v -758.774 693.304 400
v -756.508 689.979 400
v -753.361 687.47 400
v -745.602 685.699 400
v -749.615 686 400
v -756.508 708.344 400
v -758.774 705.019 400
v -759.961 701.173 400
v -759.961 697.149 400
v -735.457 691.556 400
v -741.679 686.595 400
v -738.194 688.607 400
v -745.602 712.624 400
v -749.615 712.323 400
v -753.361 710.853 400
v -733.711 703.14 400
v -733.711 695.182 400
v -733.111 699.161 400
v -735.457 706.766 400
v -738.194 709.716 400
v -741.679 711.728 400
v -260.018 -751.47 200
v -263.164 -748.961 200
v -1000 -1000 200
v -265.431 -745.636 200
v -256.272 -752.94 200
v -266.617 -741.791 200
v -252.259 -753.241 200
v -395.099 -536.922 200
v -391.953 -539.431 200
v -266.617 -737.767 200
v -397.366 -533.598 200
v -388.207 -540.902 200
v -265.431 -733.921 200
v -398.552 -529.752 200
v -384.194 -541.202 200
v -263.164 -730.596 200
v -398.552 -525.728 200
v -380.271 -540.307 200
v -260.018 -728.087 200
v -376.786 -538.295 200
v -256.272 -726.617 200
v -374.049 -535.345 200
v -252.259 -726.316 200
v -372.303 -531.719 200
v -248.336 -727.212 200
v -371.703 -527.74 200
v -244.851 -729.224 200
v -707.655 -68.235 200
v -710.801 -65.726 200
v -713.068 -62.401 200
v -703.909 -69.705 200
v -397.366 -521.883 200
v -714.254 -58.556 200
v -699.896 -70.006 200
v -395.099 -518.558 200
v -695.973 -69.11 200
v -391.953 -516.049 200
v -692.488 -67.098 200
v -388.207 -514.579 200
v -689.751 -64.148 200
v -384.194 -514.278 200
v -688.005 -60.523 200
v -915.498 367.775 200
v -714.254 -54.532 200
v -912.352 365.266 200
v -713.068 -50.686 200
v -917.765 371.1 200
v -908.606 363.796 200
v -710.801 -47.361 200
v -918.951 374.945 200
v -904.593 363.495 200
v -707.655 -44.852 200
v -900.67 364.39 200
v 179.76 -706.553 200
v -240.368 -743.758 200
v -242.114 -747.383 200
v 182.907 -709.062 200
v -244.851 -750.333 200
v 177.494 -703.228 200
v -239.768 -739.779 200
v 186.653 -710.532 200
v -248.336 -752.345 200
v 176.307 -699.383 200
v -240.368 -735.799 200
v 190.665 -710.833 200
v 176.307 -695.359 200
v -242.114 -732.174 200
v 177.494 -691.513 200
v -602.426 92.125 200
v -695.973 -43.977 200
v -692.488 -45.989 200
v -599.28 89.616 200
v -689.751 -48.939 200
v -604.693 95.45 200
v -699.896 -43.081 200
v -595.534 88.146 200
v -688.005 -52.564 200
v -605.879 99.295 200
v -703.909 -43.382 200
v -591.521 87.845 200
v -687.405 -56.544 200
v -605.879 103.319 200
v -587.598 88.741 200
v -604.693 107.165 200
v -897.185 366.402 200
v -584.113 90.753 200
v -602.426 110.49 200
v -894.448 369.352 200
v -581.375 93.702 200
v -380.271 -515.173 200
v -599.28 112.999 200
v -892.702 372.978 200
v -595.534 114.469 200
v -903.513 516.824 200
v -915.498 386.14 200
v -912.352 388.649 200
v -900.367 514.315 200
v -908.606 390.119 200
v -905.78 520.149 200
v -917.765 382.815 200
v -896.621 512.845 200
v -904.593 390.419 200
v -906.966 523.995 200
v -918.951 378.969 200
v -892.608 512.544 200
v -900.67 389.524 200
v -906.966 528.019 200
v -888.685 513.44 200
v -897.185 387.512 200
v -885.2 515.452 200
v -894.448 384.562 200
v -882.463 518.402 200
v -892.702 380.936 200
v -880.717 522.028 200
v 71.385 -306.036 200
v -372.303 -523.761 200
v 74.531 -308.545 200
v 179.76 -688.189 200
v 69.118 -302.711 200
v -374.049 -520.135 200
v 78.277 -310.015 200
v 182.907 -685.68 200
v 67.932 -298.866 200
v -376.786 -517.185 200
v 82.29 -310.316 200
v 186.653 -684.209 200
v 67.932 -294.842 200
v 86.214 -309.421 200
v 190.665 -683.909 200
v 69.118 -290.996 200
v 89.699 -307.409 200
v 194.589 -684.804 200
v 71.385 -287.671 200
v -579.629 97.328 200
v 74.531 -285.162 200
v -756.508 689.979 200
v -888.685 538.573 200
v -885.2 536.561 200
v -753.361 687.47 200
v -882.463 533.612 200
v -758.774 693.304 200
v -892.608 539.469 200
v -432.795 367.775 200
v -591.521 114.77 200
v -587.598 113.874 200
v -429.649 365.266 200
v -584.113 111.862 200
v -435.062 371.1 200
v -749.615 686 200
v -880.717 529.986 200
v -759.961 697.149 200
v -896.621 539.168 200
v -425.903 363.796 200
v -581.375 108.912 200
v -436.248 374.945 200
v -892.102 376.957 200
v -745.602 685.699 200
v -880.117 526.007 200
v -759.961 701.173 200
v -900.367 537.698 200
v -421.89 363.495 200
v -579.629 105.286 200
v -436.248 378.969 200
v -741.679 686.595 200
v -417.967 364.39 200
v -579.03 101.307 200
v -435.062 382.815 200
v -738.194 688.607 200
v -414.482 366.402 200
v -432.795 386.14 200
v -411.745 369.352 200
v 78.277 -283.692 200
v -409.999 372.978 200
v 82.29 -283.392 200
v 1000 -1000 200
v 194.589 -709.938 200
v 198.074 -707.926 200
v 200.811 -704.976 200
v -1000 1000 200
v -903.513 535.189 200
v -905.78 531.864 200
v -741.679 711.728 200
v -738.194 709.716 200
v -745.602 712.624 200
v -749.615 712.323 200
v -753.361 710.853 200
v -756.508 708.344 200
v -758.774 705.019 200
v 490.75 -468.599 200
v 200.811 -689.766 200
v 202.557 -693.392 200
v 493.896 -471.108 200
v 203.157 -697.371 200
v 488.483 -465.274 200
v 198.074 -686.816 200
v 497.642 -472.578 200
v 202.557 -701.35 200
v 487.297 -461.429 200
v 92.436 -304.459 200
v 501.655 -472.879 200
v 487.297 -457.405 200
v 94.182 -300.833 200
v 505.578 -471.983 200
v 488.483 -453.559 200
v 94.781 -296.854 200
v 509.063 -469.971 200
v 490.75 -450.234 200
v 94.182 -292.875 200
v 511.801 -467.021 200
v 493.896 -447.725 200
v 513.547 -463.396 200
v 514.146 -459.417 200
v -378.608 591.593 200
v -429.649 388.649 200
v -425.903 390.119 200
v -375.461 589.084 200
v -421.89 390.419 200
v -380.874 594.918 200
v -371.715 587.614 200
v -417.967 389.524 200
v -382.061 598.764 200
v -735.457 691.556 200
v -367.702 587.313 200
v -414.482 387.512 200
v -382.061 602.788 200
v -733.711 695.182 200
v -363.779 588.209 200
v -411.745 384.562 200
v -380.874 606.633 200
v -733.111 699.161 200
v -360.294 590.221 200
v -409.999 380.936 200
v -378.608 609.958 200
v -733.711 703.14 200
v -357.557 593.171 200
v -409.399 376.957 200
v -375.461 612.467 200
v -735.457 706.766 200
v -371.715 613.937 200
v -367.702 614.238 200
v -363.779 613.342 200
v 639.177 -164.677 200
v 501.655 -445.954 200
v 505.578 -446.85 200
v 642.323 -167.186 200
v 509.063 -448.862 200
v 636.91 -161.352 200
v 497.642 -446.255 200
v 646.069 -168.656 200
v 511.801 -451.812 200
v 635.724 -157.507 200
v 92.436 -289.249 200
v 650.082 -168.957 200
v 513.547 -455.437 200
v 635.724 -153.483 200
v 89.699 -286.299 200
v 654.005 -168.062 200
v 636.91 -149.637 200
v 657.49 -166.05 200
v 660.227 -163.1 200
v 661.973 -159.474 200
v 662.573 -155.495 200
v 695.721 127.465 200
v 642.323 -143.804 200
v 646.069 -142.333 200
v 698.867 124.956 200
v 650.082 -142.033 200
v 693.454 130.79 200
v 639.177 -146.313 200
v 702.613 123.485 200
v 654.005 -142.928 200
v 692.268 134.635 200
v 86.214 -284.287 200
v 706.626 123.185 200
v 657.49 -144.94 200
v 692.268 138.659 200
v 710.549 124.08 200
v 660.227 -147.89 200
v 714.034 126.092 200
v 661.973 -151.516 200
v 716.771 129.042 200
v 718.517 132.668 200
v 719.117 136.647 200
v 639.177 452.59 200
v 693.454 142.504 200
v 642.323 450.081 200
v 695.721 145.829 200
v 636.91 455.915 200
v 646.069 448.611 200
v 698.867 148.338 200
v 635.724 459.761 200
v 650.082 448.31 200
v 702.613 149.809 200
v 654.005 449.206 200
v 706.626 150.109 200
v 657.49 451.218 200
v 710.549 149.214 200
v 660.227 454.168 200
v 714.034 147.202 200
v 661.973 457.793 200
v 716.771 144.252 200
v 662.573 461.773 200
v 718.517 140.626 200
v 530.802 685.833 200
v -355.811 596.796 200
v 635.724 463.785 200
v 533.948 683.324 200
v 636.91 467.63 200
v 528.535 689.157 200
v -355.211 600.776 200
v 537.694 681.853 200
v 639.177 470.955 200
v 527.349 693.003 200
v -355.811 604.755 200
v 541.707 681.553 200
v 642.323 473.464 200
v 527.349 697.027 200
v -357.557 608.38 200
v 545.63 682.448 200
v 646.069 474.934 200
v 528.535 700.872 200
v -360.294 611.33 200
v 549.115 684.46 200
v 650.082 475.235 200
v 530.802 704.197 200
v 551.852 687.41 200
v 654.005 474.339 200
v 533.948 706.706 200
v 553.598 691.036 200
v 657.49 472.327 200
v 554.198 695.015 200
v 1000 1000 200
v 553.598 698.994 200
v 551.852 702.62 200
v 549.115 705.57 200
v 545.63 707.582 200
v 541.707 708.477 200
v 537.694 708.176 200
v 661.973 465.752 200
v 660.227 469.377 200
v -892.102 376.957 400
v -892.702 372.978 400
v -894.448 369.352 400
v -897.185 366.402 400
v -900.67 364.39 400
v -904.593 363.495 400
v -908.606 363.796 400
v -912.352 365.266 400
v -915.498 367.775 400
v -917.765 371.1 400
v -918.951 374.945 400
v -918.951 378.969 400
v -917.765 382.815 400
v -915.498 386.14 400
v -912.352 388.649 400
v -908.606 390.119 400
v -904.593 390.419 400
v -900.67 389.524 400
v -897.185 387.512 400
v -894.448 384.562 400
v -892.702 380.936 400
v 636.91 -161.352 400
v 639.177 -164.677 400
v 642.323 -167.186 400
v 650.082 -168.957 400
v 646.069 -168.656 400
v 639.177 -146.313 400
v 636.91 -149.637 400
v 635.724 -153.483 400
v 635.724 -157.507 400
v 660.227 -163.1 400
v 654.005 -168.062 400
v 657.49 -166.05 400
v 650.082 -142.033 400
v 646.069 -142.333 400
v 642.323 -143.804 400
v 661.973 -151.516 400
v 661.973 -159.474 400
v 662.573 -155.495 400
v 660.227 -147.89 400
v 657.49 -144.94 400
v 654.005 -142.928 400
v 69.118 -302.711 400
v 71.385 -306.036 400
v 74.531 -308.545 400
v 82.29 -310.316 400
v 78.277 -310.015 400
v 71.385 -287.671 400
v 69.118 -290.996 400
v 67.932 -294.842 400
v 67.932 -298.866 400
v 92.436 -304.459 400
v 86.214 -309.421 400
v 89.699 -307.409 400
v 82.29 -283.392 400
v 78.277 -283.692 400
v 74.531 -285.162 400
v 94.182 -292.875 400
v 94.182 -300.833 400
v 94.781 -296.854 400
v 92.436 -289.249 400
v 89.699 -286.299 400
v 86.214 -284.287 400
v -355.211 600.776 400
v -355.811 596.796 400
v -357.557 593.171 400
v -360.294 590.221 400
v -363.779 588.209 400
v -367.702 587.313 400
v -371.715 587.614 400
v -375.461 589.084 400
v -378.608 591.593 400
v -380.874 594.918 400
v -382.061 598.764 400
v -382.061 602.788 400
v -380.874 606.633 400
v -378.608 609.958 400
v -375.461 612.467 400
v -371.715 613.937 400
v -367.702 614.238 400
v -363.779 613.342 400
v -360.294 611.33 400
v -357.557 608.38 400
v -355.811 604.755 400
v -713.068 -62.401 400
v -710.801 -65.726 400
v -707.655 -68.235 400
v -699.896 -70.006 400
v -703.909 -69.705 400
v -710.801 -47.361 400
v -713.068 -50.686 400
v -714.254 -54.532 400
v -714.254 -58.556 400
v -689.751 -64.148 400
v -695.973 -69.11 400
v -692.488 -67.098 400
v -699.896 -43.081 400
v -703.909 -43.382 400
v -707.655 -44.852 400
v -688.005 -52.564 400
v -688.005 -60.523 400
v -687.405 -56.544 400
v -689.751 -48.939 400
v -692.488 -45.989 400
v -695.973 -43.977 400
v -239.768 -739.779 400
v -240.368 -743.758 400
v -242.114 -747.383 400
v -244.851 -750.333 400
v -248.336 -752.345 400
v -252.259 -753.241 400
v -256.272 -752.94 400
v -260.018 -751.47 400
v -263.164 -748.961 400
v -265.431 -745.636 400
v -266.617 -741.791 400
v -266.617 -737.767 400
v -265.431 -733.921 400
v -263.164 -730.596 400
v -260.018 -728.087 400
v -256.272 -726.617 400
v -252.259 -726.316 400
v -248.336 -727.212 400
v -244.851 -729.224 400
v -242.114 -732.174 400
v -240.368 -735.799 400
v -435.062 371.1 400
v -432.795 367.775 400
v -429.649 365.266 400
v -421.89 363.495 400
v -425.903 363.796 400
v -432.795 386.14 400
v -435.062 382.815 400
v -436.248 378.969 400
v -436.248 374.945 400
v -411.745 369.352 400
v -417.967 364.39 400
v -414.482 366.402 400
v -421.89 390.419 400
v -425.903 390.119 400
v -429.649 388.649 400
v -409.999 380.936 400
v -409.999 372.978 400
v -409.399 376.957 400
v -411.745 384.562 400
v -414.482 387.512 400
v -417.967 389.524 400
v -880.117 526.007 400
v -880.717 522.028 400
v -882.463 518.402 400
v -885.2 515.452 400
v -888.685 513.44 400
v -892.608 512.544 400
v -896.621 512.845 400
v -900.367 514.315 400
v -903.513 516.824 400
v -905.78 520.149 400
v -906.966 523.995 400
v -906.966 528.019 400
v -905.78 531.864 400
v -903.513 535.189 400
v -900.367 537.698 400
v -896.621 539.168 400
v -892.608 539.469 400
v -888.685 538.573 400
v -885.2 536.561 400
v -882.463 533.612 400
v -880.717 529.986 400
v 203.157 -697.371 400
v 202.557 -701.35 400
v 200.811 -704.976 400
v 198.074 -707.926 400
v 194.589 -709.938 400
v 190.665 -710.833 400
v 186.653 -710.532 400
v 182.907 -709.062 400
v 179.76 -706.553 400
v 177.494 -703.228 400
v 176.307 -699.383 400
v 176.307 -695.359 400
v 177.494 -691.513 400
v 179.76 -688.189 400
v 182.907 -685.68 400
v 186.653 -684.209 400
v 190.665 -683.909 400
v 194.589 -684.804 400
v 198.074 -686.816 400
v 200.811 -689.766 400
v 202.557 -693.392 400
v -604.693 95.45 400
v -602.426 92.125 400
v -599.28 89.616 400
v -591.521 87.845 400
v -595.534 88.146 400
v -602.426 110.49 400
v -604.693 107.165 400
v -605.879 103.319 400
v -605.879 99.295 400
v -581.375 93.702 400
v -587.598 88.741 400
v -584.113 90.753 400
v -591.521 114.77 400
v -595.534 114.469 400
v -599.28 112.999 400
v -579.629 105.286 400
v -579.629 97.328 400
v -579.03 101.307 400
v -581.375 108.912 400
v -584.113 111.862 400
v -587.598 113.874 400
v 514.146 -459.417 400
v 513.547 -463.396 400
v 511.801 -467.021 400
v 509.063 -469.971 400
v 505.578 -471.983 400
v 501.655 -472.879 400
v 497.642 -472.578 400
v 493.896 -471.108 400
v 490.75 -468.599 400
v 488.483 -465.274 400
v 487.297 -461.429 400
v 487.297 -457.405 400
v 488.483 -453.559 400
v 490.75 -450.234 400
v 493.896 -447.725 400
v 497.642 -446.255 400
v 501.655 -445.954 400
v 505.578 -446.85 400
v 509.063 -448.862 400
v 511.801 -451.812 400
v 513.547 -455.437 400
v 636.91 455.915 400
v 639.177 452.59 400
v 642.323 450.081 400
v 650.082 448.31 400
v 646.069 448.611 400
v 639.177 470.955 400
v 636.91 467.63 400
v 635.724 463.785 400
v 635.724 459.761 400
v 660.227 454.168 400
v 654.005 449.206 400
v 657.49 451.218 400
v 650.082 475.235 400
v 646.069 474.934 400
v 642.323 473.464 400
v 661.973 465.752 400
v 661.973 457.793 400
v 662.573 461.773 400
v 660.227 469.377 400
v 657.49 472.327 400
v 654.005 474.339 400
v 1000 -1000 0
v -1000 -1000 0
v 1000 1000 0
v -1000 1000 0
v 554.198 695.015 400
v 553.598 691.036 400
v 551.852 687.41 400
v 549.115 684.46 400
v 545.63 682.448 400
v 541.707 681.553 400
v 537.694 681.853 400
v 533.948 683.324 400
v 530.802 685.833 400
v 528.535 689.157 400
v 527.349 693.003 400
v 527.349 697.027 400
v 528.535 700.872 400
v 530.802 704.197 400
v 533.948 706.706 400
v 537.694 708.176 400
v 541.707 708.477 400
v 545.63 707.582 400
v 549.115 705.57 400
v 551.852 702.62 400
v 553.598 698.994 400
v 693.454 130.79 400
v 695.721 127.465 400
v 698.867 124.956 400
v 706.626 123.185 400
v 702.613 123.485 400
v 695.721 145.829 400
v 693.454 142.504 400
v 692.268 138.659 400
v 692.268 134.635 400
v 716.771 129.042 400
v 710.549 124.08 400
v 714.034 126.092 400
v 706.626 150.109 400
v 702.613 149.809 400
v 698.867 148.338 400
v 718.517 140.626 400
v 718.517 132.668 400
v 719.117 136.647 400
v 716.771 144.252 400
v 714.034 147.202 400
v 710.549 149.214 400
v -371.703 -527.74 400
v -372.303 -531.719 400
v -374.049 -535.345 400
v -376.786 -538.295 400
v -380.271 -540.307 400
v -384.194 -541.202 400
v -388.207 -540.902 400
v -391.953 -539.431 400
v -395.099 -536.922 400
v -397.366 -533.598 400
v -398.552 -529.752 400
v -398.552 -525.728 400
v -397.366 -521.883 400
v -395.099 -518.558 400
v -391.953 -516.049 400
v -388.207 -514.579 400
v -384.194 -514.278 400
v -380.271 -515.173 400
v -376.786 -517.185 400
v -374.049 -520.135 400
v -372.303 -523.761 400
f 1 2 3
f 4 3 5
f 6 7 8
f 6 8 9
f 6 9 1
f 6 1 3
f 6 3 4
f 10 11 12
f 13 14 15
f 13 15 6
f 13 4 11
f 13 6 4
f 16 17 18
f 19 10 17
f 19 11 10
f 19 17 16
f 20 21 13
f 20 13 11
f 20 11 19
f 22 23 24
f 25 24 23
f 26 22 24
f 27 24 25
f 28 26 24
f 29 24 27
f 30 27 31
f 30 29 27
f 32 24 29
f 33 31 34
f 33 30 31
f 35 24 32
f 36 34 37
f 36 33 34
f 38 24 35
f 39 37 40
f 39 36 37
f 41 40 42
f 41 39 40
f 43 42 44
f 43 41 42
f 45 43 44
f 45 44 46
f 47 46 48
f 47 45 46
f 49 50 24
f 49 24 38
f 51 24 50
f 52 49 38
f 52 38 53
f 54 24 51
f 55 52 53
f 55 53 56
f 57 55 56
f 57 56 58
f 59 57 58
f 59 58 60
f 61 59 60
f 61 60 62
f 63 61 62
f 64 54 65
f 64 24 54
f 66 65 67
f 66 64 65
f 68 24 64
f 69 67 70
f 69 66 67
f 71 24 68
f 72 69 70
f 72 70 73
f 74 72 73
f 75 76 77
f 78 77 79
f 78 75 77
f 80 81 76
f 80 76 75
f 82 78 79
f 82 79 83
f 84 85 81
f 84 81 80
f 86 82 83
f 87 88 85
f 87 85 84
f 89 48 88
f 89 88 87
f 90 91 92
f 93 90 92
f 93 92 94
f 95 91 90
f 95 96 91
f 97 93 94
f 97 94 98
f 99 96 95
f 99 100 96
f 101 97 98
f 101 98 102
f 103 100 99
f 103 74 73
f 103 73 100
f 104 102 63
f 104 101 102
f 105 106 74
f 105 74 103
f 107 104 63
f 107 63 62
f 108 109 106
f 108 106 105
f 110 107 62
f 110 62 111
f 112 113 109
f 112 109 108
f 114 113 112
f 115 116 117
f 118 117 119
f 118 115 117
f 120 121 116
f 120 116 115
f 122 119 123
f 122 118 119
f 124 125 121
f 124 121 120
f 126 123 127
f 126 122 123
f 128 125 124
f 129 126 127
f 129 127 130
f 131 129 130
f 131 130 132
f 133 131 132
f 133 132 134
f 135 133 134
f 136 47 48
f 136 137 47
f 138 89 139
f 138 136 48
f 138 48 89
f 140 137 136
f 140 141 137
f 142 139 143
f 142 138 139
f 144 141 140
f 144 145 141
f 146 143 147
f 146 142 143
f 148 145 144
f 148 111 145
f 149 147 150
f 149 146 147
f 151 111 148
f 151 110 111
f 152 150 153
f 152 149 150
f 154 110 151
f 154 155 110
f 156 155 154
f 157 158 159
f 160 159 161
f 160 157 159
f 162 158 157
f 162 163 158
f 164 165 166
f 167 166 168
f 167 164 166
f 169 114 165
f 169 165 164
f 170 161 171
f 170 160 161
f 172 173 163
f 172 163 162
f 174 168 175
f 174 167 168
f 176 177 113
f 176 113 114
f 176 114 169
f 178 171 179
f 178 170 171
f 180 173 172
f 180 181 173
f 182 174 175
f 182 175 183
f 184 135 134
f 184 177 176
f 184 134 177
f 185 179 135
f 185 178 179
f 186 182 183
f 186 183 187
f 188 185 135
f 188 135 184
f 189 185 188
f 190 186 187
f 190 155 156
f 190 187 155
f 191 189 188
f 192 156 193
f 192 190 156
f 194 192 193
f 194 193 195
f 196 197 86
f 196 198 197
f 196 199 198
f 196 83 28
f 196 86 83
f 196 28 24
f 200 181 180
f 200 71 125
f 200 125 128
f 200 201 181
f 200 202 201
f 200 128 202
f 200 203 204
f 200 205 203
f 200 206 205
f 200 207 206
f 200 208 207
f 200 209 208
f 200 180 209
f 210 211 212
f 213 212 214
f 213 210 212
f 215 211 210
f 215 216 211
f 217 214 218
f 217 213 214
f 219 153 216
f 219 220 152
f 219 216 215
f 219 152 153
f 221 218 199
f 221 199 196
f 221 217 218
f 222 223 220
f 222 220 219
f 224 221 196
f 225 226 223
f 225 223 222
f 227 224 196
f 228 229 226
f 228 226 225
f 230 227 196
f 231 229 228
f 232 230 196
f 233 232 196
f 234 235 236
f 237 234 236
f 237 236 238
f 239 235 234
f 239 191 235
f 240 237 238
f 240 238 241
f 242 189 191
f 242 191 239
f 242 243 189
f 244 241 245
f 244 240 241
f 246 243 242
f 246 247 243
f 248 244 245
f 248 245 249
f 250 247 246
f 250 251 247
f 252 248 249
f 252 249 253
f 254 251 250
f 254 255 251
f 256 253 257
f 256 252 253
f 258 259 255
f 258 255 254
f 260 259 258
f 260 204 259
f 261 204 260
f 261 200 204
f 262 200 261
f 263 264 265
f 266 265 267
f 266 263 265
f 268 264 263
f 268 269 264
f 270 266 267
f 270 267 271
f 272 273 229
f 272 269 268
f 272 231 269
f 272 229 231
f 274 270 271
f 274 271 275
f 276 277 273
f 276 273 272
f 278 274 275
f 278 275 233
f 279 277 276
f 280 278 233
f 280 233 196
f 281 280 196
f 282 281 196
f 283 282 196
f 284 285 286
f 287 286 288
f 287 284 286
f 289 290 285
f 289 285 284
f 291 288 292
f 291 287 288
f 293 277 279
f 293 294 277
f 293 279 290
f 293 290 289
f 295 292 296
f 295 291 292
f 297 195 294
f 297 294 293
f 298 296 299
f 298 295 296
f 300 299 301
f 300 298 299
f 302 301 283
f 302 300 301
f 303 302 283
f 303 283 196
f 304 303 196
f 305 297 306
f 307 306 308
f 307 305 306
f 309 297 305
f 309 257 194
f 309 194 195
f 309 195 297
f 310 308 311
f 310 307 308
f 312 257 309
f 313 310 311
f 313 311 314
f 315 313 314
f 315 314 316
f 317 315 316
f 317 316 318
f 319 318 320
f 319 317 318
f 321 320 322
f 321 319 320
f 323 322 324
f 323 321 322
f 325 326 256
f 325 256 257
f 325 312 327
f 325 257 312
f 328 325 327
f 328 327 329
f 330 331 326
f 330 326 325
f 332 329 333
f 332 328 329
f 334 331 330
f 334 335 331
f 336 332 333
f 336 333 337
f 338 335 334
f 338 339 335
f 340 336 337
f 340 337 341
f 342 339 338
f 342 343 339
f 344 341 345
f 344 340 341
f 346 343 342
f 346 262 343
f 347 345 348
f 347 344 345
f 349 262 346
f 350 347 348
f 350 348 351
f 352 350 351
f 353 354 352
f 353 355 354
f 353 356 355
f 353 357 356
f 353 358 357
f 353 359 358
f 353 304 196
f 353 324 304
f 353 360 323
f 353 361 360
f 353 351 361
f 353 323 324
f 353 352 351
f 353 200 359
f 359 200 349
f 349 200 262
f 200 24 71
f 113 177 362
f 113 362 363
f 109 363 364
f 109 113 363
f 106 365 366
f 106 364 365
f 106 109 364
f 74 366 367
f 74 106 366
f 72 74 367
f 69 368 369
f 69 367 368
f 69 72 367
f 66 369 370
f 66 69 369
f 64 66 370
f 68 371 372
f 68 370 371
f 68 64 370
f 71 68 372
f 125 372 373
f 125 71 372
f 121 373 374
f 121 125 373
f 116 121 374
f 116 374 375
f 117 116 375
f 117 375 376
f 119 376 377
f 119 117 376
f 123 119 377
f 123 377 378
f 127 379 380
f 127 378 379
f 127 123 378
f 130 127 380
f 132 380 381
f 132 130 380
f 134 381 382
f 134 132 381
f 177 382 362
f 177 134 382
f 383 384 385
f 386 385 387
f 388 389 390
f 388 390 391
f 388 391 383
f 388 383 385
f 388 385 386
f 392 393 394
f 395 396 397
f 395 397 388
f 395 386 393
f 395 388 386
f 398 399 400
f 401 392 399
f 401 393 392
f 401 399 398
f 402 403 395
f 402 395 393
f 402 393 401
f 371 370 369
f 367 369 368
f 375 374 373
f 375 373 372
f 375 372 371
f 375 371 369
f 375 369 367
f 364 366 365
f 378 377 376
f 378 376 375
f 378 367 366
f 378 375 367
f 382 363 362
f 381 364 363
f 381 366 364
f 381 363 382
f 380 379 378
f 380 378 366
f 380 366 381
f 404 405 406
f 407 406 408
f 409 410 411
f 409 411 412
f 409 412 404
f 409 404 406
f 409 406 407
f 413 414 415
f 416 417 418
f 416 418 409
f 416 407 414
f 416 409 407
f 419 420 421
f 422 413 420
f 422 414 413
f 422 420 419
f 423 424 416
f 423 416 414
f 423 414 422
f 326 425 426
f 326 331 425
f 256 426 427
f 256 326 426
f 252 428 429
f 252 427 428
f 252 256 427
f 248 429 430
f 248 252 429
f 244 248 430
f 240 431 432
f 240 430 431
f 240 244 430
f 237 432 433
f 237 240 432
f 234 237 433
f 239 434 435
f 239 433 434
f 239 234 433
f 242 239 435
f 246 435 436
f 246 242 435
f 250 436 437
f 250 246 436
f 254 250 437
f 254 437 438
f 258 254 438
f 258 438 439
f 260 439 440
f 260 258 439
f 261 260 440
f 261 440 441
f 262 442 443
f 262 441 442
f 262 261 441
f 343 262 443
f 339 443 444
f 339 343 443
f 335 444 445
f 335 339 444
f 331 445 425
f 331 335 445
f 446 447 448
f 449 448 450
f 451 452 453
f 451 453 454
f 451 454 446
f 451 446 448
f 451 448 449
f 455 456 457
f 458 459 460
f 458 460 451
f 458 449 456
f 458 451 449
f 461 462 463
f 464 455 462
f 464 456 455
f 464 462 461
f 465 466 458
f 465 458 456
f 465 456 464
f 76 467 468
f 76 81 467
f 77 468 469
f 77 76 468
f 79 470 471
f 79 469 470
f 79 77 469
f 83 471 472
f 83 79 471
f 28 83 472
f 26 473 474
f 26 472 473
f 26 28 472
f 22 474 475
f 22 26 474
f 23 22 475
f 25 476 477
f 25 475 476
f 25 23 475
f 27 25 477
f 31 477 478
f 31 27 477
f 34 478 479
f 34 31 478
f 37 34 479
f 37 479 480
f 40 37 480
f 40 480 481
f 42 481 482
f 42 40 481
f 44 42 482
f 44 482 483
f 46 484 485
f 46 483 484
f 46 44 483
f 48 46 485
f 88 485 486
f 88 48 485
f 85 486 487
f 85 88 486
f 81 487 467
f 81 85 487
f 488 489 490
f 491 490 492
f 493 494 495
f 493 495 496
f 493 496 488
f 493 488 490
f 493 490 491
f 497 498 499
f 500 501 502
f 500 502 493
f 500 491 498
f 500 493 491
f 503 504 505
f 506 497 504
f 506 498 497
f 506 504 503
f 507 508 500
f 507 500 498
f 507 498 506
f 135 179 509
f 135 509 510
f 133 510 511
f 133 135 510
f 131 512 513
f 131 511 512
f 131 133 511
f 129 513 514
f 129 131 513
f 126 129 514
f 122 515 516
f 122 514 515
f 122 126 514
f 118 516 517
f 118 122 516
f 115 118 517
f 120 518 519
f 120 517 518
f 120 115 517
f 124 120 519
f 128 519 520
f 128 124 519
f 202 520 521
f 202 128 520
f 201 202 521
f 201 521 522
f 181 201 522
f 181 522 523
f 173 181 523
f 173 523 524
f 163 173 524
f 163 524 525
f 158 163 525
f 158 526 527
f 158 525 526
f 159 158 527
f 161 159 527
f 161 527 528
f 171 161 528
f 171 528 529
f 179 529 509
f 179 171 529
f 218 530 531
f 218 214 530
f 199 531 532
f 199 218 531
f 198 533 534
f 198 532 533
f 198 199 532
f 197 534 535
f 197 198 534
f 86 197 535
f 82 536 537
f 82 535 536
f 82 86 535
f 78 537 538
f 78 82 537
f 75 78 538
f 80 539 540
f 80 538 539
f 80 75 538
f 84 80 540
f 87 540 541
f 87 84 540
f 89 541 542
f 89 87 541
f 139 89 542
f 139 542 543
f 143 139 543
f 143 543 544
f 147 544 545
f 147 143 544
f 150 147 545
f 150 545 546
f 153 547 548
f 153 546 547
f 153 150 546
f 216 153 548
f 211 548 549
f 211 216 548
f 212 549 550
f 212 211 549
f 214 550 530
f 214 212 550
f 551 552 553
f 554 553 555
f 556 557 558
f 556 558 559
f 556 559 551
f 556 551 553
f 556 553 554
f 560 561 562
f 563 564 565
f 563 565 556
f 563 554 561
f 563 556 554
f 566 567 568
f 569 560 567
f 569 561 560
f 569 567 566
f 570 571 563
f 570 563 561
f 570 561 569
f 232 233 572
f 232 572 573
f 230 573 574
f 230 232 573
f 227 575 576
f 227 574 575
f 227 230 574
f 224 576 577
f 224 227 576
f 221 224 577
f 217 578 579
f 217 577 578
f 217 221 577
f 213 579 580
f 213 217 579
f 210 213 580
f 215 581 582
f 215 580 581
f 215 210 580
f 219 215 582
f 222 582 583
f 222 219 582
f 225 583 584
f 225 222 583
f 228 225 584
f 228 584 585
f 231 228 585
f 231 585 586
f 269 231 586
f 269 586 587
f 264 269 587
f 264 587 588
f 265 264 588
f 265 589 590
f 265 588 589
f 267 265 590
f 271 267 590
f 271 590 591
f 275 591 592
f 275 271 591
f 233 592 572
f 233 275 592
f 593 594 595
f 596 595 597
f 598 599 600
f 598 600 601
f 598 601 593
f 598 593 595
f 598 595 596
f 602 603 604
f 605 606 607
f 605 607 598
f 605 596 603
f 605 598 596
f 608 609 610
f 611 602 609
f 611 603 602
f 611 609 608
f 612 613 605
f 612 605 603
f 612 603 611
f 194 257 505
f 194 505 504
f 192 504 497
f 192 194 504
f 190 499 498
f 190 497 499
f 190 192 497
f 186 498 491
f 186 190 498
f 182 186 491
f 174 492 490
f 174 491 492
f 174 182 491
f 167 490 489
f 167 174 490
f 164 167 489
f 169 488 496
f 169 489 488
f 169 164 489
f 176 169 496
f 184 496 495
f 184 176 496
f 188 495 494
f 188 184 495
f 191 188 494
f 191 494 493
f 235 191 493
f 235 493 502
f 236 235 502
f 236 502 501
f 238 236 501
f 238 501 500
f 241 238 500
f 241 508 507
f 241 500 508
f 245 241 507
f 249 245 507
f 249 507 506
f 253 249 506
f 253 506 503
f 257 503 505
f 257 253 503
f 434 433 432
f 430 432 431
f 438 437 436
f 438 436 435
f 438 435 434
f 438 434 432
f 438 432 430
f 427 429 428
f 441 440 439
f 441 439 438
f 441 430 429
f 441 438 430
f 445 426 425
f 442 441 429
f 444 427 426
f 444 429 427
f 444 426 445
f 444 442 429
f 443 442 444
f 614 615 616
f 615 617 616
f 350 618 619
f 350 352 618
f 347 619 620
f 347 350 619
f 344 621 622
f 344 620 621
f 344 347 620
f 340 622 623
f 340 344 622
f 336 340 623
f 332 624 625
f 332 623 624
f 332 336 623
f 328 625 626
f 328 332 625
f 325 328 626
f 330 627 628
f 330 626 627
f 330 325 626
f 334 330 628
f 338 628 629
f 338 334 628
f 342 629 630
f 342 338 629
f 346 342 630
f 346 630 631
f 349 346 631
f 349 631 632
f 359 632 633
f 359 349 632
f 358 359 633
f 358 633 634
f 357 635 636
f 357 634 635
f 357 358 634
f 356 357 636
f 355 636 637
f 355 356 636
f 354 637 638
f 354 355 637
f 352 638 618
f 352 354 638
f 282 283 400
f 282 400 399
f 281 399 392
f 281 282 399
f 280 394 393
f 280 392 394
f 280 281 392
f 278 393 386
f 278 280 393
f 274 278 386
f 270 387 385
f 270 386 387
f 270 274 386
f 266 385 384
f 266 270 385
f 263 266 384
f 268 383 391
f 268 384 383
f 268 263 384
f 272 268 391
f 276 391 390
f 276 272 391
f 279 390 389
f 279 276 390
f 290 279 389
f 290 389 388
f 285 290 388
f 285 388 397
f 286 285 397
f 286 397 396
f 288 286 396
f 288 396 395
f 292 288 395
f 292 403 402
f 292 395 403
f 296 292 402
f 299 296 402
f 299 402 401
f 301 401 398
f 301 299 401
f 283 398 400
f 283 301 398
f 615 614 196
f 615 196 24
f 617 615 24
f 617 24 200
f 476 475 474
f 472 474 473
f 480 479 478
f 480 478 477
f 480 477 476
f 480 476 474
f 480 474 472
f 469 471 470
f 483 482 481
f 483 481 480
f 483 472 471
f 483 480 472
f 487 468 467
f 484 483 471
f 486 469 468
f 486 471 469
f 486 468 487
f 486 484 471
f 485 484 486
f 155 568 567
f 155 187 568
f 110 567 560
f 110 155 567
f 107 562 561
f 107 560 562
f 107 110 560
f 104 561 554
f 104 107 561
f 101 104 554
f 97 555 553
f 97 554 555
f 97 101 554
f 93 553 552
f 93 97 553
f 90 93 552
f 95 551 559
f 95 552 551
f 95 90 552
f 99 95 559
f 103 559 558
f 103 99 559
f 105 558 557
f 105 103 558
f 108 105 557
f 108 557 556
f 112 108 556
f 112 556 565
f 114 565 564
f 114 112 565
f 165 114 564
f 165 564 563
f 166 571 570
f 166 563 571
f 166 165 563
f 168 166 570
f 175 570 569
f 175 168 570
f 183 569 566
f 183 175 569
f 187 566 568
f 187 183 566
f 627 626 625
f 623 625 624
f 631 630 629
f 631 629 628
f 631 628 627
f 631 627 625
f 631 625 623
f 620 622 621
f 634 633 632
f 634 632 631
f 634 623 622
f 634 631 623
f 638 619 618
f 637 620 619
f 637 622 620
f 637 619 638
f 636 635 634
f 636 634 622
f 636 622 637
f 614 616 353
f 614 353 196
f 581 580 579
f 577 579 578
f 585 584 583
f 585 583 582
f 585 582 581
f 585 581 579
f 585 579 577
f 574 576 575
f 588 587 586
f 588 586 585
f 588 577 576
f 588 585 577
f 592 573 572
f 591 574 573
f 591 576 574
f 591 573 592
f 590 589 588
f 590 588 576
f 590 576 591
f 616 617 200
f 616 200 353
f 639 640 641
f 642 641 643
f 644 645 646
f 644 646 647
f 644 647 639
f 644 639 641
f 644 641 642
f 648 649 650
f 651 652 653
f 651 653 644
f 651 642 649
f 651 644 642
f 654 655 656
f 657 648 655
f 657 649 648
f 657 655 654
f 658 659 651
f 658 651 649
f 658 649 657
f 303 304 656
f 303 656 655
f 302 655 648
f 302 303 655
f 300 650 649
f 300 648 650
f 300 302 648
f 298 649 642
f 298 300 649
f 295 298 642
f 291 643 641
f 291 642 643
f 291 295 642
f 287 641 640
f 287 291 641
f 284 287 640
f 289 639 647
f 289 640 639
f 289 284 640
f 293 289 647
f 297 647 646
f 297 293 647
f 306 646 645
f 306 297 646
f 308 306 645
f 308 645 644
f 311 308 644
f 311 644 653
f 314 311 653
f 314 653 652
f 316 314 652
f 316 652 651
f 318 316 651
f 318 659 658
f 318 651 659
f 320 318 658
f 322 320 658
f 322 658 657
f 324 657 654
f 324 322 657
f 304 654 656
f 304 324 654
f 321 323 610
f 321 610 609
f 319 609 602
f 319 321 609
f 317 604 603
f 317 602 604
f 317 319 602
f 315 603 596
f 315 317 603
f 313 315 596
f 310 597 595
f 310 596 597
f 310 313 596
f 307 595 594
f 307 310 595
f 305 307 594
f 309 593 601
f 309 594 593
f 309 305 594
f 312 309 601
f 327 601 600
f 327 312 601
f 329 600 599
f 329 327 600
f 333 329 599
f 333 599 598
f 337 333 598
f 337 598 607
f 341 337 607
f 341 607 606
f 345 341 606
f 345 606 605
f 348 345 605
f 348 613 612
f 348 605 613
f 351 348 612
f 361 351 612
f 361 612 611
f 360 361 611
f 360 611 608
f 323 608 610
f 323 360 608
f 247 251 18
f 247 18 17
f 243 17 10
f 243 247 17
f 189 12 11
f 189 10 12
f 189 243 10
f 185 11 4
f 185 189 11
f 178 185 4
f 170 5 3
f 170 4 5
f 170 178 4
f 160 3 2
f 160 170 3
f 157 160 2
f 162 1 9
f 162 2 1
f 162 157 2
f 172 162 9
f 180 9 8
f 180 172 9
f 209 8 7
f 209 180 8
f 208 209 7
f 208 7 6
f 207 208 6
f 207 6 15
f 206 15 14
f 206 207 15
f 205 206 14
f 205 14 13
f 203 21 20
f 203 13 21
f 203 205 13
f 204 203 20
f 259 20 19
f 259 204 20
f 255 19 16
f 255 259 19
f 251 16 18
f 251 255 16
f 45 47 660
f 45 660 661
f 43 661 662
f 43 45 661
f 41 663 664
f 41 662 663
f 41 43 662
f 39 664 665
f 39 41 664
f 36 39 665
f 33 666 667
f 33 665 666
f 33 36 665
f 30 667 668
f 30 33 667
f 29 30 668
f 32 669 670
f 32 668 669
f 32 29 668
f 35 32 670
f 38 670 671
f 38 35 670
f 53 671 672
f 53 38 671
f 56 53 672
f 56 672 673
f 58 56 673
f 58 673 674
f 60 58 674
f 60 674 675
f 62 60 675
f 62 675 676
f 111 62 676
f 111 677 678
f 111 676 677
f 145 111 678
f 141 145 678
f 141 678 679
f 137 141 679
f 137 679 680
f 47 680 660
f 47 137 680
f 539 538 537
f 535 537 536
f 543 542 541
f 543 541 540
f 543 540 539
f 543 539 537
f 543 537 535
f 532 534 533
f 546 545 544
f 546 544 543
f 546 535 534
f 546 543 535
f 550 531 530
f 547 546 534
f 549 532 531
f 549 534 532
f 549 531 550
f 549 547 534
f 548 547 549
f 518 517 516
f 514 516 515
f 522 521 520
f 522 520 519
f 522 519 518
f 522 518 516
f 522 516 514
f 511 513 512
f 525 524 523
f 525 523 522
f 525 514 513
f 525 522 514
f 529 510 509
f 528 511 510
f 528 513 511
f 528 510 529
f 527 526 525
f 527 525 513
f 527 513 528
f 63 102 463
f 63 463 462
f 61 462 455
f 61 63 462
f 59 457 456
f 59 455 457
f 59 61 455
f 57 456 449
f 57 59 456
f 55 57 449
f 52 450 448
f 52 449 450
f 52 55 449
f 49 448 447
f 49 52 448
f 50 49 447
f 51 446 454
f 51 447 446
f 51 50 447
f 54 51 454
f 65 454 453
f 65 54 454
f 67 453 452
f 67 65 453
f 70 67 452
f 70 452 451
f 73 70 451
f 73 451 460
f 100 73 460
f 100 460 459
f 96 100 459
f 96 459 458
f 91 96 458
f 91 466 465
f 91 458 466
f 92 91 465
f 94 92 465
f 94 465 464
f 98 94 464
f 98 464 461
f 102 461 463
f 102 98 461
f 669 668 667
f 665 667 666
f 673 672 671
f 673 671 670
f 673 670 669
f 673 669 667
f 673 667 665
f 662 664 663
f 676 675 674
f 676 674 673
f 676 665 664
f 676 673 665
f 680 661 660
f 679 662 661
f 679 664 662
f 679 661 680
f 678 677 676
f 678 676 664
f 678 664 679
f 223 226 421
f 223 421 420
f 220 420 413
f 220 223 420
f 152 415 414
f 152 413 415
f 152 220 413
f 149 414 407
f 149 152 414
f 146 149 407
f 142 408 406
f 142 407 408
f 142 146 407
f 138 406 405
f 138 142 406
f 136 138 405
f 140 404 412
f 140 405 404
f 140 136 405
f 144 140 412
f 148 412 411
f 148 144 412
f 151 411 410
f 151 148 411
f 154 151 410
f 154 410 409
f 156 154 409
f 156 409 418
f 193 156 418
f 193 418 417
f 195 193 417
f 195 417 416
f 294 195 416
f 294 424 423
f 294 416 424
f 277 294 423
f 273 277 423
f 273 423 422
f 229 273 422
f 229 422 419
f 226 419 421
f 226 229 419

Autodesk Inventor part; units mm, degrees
ref_plane "YZ Plane" through (0, 0, 0) normal (1, 0, 0) x (0, 1, 0)
ref_plane "XZ Plane" through (0, 0, 0) normal (0, 1, 0) x (-1, 0, 0)
ref_plane "XY Plane" through (0, 0, 0) normal (0, 0, 1) x (1, 0, 0)
sketch "Sketch1" plane through (0, 0, 0) normal (0, 0, 1) x (1, 0, 0)
  line L0 (-1000, 1000) -> (1000, 1000)
  line L1 (1000, 1000) -> (1000, -1000)
  line L2 (1000, -1000) -> (-1000, -1000)
  line L3 (-1000, -1000) -> (-1000, 1000)
  line L4 (-1000, 1000) -> (1000, -1000) construction
  line L5 (1000, 1000) -> (-1000, -1000) construction
  point P0 (0, 0)
  dimension "d0" = 2000
  dimension "d1" = 2000
extrude "Extrusion1" add sketch "Sketch1" along normal blind 200
sketch "Sketch2" plane through (0, 0, 200) normal (0, 0, 1) x (1, 0, 0)
  circle A0 centre (-746.6113, 699.1613) radius 13.5
  point P0 (0, 0)
  dimension "d4" = 27
extrude "Extrusion2" add sketch "Sketch2" along normal blind 200
pattern_sketch "Sketch Driven Pattern1" of "Extrusion2" from (-746.6113, 699.1613, 200) copies at (-368.7113, 600.7756, 200) at (540.698, 695.0149, 200) at (649.0732, 461.7726, 200) at (705.6168, 136.647, 200) at (649.0732, -155.4949, 200) at (500.6463, -459.4166, 200) at (189.6566, -697.3709, 200) at (-253.2681, -739.7786, 200) at (-385.2032, -527.7401, 200) at (81.2814, -296.8538, 200) at (-422.8989, 376.9572, 200) at (-592.5297, 101.3073, 200) at (-700.9049, -56.5436, 200) at (-893.617, 526.0067, 200) at (-905.6018, 376.9572, 200)
sketch "Sketch3" plane through (0, 0, 200) normal (0, 0, 1) x (1, 0, 0)
  point P0 (-368.7113, 600.7756)
  point P1 (175.5207, 631.4034)
  point P2 (540.698, 695.0149)
  point P3 (649.0732, 461.7726)
  point P4 (705.6168, 136.647)
  point P5 (649.0732, -155.4949)
  point P6 (500.6463, -459.4166)
  point P7 (189.6566, -697.3709)
  point P8 (-253.2681, -739.7786)
  point P9 (-385.2032, -527.7401)
  point P10 (81.2814, -296.8538)
  point P11 (-422.8989, 376.9572)
  point P12 (-592.5297, 101.3073)
  point P13 (-700.9049, -56.5436)
  point P14 (-893.617, 526.0067)
  point P15 (-905.6018, 376.9572)
